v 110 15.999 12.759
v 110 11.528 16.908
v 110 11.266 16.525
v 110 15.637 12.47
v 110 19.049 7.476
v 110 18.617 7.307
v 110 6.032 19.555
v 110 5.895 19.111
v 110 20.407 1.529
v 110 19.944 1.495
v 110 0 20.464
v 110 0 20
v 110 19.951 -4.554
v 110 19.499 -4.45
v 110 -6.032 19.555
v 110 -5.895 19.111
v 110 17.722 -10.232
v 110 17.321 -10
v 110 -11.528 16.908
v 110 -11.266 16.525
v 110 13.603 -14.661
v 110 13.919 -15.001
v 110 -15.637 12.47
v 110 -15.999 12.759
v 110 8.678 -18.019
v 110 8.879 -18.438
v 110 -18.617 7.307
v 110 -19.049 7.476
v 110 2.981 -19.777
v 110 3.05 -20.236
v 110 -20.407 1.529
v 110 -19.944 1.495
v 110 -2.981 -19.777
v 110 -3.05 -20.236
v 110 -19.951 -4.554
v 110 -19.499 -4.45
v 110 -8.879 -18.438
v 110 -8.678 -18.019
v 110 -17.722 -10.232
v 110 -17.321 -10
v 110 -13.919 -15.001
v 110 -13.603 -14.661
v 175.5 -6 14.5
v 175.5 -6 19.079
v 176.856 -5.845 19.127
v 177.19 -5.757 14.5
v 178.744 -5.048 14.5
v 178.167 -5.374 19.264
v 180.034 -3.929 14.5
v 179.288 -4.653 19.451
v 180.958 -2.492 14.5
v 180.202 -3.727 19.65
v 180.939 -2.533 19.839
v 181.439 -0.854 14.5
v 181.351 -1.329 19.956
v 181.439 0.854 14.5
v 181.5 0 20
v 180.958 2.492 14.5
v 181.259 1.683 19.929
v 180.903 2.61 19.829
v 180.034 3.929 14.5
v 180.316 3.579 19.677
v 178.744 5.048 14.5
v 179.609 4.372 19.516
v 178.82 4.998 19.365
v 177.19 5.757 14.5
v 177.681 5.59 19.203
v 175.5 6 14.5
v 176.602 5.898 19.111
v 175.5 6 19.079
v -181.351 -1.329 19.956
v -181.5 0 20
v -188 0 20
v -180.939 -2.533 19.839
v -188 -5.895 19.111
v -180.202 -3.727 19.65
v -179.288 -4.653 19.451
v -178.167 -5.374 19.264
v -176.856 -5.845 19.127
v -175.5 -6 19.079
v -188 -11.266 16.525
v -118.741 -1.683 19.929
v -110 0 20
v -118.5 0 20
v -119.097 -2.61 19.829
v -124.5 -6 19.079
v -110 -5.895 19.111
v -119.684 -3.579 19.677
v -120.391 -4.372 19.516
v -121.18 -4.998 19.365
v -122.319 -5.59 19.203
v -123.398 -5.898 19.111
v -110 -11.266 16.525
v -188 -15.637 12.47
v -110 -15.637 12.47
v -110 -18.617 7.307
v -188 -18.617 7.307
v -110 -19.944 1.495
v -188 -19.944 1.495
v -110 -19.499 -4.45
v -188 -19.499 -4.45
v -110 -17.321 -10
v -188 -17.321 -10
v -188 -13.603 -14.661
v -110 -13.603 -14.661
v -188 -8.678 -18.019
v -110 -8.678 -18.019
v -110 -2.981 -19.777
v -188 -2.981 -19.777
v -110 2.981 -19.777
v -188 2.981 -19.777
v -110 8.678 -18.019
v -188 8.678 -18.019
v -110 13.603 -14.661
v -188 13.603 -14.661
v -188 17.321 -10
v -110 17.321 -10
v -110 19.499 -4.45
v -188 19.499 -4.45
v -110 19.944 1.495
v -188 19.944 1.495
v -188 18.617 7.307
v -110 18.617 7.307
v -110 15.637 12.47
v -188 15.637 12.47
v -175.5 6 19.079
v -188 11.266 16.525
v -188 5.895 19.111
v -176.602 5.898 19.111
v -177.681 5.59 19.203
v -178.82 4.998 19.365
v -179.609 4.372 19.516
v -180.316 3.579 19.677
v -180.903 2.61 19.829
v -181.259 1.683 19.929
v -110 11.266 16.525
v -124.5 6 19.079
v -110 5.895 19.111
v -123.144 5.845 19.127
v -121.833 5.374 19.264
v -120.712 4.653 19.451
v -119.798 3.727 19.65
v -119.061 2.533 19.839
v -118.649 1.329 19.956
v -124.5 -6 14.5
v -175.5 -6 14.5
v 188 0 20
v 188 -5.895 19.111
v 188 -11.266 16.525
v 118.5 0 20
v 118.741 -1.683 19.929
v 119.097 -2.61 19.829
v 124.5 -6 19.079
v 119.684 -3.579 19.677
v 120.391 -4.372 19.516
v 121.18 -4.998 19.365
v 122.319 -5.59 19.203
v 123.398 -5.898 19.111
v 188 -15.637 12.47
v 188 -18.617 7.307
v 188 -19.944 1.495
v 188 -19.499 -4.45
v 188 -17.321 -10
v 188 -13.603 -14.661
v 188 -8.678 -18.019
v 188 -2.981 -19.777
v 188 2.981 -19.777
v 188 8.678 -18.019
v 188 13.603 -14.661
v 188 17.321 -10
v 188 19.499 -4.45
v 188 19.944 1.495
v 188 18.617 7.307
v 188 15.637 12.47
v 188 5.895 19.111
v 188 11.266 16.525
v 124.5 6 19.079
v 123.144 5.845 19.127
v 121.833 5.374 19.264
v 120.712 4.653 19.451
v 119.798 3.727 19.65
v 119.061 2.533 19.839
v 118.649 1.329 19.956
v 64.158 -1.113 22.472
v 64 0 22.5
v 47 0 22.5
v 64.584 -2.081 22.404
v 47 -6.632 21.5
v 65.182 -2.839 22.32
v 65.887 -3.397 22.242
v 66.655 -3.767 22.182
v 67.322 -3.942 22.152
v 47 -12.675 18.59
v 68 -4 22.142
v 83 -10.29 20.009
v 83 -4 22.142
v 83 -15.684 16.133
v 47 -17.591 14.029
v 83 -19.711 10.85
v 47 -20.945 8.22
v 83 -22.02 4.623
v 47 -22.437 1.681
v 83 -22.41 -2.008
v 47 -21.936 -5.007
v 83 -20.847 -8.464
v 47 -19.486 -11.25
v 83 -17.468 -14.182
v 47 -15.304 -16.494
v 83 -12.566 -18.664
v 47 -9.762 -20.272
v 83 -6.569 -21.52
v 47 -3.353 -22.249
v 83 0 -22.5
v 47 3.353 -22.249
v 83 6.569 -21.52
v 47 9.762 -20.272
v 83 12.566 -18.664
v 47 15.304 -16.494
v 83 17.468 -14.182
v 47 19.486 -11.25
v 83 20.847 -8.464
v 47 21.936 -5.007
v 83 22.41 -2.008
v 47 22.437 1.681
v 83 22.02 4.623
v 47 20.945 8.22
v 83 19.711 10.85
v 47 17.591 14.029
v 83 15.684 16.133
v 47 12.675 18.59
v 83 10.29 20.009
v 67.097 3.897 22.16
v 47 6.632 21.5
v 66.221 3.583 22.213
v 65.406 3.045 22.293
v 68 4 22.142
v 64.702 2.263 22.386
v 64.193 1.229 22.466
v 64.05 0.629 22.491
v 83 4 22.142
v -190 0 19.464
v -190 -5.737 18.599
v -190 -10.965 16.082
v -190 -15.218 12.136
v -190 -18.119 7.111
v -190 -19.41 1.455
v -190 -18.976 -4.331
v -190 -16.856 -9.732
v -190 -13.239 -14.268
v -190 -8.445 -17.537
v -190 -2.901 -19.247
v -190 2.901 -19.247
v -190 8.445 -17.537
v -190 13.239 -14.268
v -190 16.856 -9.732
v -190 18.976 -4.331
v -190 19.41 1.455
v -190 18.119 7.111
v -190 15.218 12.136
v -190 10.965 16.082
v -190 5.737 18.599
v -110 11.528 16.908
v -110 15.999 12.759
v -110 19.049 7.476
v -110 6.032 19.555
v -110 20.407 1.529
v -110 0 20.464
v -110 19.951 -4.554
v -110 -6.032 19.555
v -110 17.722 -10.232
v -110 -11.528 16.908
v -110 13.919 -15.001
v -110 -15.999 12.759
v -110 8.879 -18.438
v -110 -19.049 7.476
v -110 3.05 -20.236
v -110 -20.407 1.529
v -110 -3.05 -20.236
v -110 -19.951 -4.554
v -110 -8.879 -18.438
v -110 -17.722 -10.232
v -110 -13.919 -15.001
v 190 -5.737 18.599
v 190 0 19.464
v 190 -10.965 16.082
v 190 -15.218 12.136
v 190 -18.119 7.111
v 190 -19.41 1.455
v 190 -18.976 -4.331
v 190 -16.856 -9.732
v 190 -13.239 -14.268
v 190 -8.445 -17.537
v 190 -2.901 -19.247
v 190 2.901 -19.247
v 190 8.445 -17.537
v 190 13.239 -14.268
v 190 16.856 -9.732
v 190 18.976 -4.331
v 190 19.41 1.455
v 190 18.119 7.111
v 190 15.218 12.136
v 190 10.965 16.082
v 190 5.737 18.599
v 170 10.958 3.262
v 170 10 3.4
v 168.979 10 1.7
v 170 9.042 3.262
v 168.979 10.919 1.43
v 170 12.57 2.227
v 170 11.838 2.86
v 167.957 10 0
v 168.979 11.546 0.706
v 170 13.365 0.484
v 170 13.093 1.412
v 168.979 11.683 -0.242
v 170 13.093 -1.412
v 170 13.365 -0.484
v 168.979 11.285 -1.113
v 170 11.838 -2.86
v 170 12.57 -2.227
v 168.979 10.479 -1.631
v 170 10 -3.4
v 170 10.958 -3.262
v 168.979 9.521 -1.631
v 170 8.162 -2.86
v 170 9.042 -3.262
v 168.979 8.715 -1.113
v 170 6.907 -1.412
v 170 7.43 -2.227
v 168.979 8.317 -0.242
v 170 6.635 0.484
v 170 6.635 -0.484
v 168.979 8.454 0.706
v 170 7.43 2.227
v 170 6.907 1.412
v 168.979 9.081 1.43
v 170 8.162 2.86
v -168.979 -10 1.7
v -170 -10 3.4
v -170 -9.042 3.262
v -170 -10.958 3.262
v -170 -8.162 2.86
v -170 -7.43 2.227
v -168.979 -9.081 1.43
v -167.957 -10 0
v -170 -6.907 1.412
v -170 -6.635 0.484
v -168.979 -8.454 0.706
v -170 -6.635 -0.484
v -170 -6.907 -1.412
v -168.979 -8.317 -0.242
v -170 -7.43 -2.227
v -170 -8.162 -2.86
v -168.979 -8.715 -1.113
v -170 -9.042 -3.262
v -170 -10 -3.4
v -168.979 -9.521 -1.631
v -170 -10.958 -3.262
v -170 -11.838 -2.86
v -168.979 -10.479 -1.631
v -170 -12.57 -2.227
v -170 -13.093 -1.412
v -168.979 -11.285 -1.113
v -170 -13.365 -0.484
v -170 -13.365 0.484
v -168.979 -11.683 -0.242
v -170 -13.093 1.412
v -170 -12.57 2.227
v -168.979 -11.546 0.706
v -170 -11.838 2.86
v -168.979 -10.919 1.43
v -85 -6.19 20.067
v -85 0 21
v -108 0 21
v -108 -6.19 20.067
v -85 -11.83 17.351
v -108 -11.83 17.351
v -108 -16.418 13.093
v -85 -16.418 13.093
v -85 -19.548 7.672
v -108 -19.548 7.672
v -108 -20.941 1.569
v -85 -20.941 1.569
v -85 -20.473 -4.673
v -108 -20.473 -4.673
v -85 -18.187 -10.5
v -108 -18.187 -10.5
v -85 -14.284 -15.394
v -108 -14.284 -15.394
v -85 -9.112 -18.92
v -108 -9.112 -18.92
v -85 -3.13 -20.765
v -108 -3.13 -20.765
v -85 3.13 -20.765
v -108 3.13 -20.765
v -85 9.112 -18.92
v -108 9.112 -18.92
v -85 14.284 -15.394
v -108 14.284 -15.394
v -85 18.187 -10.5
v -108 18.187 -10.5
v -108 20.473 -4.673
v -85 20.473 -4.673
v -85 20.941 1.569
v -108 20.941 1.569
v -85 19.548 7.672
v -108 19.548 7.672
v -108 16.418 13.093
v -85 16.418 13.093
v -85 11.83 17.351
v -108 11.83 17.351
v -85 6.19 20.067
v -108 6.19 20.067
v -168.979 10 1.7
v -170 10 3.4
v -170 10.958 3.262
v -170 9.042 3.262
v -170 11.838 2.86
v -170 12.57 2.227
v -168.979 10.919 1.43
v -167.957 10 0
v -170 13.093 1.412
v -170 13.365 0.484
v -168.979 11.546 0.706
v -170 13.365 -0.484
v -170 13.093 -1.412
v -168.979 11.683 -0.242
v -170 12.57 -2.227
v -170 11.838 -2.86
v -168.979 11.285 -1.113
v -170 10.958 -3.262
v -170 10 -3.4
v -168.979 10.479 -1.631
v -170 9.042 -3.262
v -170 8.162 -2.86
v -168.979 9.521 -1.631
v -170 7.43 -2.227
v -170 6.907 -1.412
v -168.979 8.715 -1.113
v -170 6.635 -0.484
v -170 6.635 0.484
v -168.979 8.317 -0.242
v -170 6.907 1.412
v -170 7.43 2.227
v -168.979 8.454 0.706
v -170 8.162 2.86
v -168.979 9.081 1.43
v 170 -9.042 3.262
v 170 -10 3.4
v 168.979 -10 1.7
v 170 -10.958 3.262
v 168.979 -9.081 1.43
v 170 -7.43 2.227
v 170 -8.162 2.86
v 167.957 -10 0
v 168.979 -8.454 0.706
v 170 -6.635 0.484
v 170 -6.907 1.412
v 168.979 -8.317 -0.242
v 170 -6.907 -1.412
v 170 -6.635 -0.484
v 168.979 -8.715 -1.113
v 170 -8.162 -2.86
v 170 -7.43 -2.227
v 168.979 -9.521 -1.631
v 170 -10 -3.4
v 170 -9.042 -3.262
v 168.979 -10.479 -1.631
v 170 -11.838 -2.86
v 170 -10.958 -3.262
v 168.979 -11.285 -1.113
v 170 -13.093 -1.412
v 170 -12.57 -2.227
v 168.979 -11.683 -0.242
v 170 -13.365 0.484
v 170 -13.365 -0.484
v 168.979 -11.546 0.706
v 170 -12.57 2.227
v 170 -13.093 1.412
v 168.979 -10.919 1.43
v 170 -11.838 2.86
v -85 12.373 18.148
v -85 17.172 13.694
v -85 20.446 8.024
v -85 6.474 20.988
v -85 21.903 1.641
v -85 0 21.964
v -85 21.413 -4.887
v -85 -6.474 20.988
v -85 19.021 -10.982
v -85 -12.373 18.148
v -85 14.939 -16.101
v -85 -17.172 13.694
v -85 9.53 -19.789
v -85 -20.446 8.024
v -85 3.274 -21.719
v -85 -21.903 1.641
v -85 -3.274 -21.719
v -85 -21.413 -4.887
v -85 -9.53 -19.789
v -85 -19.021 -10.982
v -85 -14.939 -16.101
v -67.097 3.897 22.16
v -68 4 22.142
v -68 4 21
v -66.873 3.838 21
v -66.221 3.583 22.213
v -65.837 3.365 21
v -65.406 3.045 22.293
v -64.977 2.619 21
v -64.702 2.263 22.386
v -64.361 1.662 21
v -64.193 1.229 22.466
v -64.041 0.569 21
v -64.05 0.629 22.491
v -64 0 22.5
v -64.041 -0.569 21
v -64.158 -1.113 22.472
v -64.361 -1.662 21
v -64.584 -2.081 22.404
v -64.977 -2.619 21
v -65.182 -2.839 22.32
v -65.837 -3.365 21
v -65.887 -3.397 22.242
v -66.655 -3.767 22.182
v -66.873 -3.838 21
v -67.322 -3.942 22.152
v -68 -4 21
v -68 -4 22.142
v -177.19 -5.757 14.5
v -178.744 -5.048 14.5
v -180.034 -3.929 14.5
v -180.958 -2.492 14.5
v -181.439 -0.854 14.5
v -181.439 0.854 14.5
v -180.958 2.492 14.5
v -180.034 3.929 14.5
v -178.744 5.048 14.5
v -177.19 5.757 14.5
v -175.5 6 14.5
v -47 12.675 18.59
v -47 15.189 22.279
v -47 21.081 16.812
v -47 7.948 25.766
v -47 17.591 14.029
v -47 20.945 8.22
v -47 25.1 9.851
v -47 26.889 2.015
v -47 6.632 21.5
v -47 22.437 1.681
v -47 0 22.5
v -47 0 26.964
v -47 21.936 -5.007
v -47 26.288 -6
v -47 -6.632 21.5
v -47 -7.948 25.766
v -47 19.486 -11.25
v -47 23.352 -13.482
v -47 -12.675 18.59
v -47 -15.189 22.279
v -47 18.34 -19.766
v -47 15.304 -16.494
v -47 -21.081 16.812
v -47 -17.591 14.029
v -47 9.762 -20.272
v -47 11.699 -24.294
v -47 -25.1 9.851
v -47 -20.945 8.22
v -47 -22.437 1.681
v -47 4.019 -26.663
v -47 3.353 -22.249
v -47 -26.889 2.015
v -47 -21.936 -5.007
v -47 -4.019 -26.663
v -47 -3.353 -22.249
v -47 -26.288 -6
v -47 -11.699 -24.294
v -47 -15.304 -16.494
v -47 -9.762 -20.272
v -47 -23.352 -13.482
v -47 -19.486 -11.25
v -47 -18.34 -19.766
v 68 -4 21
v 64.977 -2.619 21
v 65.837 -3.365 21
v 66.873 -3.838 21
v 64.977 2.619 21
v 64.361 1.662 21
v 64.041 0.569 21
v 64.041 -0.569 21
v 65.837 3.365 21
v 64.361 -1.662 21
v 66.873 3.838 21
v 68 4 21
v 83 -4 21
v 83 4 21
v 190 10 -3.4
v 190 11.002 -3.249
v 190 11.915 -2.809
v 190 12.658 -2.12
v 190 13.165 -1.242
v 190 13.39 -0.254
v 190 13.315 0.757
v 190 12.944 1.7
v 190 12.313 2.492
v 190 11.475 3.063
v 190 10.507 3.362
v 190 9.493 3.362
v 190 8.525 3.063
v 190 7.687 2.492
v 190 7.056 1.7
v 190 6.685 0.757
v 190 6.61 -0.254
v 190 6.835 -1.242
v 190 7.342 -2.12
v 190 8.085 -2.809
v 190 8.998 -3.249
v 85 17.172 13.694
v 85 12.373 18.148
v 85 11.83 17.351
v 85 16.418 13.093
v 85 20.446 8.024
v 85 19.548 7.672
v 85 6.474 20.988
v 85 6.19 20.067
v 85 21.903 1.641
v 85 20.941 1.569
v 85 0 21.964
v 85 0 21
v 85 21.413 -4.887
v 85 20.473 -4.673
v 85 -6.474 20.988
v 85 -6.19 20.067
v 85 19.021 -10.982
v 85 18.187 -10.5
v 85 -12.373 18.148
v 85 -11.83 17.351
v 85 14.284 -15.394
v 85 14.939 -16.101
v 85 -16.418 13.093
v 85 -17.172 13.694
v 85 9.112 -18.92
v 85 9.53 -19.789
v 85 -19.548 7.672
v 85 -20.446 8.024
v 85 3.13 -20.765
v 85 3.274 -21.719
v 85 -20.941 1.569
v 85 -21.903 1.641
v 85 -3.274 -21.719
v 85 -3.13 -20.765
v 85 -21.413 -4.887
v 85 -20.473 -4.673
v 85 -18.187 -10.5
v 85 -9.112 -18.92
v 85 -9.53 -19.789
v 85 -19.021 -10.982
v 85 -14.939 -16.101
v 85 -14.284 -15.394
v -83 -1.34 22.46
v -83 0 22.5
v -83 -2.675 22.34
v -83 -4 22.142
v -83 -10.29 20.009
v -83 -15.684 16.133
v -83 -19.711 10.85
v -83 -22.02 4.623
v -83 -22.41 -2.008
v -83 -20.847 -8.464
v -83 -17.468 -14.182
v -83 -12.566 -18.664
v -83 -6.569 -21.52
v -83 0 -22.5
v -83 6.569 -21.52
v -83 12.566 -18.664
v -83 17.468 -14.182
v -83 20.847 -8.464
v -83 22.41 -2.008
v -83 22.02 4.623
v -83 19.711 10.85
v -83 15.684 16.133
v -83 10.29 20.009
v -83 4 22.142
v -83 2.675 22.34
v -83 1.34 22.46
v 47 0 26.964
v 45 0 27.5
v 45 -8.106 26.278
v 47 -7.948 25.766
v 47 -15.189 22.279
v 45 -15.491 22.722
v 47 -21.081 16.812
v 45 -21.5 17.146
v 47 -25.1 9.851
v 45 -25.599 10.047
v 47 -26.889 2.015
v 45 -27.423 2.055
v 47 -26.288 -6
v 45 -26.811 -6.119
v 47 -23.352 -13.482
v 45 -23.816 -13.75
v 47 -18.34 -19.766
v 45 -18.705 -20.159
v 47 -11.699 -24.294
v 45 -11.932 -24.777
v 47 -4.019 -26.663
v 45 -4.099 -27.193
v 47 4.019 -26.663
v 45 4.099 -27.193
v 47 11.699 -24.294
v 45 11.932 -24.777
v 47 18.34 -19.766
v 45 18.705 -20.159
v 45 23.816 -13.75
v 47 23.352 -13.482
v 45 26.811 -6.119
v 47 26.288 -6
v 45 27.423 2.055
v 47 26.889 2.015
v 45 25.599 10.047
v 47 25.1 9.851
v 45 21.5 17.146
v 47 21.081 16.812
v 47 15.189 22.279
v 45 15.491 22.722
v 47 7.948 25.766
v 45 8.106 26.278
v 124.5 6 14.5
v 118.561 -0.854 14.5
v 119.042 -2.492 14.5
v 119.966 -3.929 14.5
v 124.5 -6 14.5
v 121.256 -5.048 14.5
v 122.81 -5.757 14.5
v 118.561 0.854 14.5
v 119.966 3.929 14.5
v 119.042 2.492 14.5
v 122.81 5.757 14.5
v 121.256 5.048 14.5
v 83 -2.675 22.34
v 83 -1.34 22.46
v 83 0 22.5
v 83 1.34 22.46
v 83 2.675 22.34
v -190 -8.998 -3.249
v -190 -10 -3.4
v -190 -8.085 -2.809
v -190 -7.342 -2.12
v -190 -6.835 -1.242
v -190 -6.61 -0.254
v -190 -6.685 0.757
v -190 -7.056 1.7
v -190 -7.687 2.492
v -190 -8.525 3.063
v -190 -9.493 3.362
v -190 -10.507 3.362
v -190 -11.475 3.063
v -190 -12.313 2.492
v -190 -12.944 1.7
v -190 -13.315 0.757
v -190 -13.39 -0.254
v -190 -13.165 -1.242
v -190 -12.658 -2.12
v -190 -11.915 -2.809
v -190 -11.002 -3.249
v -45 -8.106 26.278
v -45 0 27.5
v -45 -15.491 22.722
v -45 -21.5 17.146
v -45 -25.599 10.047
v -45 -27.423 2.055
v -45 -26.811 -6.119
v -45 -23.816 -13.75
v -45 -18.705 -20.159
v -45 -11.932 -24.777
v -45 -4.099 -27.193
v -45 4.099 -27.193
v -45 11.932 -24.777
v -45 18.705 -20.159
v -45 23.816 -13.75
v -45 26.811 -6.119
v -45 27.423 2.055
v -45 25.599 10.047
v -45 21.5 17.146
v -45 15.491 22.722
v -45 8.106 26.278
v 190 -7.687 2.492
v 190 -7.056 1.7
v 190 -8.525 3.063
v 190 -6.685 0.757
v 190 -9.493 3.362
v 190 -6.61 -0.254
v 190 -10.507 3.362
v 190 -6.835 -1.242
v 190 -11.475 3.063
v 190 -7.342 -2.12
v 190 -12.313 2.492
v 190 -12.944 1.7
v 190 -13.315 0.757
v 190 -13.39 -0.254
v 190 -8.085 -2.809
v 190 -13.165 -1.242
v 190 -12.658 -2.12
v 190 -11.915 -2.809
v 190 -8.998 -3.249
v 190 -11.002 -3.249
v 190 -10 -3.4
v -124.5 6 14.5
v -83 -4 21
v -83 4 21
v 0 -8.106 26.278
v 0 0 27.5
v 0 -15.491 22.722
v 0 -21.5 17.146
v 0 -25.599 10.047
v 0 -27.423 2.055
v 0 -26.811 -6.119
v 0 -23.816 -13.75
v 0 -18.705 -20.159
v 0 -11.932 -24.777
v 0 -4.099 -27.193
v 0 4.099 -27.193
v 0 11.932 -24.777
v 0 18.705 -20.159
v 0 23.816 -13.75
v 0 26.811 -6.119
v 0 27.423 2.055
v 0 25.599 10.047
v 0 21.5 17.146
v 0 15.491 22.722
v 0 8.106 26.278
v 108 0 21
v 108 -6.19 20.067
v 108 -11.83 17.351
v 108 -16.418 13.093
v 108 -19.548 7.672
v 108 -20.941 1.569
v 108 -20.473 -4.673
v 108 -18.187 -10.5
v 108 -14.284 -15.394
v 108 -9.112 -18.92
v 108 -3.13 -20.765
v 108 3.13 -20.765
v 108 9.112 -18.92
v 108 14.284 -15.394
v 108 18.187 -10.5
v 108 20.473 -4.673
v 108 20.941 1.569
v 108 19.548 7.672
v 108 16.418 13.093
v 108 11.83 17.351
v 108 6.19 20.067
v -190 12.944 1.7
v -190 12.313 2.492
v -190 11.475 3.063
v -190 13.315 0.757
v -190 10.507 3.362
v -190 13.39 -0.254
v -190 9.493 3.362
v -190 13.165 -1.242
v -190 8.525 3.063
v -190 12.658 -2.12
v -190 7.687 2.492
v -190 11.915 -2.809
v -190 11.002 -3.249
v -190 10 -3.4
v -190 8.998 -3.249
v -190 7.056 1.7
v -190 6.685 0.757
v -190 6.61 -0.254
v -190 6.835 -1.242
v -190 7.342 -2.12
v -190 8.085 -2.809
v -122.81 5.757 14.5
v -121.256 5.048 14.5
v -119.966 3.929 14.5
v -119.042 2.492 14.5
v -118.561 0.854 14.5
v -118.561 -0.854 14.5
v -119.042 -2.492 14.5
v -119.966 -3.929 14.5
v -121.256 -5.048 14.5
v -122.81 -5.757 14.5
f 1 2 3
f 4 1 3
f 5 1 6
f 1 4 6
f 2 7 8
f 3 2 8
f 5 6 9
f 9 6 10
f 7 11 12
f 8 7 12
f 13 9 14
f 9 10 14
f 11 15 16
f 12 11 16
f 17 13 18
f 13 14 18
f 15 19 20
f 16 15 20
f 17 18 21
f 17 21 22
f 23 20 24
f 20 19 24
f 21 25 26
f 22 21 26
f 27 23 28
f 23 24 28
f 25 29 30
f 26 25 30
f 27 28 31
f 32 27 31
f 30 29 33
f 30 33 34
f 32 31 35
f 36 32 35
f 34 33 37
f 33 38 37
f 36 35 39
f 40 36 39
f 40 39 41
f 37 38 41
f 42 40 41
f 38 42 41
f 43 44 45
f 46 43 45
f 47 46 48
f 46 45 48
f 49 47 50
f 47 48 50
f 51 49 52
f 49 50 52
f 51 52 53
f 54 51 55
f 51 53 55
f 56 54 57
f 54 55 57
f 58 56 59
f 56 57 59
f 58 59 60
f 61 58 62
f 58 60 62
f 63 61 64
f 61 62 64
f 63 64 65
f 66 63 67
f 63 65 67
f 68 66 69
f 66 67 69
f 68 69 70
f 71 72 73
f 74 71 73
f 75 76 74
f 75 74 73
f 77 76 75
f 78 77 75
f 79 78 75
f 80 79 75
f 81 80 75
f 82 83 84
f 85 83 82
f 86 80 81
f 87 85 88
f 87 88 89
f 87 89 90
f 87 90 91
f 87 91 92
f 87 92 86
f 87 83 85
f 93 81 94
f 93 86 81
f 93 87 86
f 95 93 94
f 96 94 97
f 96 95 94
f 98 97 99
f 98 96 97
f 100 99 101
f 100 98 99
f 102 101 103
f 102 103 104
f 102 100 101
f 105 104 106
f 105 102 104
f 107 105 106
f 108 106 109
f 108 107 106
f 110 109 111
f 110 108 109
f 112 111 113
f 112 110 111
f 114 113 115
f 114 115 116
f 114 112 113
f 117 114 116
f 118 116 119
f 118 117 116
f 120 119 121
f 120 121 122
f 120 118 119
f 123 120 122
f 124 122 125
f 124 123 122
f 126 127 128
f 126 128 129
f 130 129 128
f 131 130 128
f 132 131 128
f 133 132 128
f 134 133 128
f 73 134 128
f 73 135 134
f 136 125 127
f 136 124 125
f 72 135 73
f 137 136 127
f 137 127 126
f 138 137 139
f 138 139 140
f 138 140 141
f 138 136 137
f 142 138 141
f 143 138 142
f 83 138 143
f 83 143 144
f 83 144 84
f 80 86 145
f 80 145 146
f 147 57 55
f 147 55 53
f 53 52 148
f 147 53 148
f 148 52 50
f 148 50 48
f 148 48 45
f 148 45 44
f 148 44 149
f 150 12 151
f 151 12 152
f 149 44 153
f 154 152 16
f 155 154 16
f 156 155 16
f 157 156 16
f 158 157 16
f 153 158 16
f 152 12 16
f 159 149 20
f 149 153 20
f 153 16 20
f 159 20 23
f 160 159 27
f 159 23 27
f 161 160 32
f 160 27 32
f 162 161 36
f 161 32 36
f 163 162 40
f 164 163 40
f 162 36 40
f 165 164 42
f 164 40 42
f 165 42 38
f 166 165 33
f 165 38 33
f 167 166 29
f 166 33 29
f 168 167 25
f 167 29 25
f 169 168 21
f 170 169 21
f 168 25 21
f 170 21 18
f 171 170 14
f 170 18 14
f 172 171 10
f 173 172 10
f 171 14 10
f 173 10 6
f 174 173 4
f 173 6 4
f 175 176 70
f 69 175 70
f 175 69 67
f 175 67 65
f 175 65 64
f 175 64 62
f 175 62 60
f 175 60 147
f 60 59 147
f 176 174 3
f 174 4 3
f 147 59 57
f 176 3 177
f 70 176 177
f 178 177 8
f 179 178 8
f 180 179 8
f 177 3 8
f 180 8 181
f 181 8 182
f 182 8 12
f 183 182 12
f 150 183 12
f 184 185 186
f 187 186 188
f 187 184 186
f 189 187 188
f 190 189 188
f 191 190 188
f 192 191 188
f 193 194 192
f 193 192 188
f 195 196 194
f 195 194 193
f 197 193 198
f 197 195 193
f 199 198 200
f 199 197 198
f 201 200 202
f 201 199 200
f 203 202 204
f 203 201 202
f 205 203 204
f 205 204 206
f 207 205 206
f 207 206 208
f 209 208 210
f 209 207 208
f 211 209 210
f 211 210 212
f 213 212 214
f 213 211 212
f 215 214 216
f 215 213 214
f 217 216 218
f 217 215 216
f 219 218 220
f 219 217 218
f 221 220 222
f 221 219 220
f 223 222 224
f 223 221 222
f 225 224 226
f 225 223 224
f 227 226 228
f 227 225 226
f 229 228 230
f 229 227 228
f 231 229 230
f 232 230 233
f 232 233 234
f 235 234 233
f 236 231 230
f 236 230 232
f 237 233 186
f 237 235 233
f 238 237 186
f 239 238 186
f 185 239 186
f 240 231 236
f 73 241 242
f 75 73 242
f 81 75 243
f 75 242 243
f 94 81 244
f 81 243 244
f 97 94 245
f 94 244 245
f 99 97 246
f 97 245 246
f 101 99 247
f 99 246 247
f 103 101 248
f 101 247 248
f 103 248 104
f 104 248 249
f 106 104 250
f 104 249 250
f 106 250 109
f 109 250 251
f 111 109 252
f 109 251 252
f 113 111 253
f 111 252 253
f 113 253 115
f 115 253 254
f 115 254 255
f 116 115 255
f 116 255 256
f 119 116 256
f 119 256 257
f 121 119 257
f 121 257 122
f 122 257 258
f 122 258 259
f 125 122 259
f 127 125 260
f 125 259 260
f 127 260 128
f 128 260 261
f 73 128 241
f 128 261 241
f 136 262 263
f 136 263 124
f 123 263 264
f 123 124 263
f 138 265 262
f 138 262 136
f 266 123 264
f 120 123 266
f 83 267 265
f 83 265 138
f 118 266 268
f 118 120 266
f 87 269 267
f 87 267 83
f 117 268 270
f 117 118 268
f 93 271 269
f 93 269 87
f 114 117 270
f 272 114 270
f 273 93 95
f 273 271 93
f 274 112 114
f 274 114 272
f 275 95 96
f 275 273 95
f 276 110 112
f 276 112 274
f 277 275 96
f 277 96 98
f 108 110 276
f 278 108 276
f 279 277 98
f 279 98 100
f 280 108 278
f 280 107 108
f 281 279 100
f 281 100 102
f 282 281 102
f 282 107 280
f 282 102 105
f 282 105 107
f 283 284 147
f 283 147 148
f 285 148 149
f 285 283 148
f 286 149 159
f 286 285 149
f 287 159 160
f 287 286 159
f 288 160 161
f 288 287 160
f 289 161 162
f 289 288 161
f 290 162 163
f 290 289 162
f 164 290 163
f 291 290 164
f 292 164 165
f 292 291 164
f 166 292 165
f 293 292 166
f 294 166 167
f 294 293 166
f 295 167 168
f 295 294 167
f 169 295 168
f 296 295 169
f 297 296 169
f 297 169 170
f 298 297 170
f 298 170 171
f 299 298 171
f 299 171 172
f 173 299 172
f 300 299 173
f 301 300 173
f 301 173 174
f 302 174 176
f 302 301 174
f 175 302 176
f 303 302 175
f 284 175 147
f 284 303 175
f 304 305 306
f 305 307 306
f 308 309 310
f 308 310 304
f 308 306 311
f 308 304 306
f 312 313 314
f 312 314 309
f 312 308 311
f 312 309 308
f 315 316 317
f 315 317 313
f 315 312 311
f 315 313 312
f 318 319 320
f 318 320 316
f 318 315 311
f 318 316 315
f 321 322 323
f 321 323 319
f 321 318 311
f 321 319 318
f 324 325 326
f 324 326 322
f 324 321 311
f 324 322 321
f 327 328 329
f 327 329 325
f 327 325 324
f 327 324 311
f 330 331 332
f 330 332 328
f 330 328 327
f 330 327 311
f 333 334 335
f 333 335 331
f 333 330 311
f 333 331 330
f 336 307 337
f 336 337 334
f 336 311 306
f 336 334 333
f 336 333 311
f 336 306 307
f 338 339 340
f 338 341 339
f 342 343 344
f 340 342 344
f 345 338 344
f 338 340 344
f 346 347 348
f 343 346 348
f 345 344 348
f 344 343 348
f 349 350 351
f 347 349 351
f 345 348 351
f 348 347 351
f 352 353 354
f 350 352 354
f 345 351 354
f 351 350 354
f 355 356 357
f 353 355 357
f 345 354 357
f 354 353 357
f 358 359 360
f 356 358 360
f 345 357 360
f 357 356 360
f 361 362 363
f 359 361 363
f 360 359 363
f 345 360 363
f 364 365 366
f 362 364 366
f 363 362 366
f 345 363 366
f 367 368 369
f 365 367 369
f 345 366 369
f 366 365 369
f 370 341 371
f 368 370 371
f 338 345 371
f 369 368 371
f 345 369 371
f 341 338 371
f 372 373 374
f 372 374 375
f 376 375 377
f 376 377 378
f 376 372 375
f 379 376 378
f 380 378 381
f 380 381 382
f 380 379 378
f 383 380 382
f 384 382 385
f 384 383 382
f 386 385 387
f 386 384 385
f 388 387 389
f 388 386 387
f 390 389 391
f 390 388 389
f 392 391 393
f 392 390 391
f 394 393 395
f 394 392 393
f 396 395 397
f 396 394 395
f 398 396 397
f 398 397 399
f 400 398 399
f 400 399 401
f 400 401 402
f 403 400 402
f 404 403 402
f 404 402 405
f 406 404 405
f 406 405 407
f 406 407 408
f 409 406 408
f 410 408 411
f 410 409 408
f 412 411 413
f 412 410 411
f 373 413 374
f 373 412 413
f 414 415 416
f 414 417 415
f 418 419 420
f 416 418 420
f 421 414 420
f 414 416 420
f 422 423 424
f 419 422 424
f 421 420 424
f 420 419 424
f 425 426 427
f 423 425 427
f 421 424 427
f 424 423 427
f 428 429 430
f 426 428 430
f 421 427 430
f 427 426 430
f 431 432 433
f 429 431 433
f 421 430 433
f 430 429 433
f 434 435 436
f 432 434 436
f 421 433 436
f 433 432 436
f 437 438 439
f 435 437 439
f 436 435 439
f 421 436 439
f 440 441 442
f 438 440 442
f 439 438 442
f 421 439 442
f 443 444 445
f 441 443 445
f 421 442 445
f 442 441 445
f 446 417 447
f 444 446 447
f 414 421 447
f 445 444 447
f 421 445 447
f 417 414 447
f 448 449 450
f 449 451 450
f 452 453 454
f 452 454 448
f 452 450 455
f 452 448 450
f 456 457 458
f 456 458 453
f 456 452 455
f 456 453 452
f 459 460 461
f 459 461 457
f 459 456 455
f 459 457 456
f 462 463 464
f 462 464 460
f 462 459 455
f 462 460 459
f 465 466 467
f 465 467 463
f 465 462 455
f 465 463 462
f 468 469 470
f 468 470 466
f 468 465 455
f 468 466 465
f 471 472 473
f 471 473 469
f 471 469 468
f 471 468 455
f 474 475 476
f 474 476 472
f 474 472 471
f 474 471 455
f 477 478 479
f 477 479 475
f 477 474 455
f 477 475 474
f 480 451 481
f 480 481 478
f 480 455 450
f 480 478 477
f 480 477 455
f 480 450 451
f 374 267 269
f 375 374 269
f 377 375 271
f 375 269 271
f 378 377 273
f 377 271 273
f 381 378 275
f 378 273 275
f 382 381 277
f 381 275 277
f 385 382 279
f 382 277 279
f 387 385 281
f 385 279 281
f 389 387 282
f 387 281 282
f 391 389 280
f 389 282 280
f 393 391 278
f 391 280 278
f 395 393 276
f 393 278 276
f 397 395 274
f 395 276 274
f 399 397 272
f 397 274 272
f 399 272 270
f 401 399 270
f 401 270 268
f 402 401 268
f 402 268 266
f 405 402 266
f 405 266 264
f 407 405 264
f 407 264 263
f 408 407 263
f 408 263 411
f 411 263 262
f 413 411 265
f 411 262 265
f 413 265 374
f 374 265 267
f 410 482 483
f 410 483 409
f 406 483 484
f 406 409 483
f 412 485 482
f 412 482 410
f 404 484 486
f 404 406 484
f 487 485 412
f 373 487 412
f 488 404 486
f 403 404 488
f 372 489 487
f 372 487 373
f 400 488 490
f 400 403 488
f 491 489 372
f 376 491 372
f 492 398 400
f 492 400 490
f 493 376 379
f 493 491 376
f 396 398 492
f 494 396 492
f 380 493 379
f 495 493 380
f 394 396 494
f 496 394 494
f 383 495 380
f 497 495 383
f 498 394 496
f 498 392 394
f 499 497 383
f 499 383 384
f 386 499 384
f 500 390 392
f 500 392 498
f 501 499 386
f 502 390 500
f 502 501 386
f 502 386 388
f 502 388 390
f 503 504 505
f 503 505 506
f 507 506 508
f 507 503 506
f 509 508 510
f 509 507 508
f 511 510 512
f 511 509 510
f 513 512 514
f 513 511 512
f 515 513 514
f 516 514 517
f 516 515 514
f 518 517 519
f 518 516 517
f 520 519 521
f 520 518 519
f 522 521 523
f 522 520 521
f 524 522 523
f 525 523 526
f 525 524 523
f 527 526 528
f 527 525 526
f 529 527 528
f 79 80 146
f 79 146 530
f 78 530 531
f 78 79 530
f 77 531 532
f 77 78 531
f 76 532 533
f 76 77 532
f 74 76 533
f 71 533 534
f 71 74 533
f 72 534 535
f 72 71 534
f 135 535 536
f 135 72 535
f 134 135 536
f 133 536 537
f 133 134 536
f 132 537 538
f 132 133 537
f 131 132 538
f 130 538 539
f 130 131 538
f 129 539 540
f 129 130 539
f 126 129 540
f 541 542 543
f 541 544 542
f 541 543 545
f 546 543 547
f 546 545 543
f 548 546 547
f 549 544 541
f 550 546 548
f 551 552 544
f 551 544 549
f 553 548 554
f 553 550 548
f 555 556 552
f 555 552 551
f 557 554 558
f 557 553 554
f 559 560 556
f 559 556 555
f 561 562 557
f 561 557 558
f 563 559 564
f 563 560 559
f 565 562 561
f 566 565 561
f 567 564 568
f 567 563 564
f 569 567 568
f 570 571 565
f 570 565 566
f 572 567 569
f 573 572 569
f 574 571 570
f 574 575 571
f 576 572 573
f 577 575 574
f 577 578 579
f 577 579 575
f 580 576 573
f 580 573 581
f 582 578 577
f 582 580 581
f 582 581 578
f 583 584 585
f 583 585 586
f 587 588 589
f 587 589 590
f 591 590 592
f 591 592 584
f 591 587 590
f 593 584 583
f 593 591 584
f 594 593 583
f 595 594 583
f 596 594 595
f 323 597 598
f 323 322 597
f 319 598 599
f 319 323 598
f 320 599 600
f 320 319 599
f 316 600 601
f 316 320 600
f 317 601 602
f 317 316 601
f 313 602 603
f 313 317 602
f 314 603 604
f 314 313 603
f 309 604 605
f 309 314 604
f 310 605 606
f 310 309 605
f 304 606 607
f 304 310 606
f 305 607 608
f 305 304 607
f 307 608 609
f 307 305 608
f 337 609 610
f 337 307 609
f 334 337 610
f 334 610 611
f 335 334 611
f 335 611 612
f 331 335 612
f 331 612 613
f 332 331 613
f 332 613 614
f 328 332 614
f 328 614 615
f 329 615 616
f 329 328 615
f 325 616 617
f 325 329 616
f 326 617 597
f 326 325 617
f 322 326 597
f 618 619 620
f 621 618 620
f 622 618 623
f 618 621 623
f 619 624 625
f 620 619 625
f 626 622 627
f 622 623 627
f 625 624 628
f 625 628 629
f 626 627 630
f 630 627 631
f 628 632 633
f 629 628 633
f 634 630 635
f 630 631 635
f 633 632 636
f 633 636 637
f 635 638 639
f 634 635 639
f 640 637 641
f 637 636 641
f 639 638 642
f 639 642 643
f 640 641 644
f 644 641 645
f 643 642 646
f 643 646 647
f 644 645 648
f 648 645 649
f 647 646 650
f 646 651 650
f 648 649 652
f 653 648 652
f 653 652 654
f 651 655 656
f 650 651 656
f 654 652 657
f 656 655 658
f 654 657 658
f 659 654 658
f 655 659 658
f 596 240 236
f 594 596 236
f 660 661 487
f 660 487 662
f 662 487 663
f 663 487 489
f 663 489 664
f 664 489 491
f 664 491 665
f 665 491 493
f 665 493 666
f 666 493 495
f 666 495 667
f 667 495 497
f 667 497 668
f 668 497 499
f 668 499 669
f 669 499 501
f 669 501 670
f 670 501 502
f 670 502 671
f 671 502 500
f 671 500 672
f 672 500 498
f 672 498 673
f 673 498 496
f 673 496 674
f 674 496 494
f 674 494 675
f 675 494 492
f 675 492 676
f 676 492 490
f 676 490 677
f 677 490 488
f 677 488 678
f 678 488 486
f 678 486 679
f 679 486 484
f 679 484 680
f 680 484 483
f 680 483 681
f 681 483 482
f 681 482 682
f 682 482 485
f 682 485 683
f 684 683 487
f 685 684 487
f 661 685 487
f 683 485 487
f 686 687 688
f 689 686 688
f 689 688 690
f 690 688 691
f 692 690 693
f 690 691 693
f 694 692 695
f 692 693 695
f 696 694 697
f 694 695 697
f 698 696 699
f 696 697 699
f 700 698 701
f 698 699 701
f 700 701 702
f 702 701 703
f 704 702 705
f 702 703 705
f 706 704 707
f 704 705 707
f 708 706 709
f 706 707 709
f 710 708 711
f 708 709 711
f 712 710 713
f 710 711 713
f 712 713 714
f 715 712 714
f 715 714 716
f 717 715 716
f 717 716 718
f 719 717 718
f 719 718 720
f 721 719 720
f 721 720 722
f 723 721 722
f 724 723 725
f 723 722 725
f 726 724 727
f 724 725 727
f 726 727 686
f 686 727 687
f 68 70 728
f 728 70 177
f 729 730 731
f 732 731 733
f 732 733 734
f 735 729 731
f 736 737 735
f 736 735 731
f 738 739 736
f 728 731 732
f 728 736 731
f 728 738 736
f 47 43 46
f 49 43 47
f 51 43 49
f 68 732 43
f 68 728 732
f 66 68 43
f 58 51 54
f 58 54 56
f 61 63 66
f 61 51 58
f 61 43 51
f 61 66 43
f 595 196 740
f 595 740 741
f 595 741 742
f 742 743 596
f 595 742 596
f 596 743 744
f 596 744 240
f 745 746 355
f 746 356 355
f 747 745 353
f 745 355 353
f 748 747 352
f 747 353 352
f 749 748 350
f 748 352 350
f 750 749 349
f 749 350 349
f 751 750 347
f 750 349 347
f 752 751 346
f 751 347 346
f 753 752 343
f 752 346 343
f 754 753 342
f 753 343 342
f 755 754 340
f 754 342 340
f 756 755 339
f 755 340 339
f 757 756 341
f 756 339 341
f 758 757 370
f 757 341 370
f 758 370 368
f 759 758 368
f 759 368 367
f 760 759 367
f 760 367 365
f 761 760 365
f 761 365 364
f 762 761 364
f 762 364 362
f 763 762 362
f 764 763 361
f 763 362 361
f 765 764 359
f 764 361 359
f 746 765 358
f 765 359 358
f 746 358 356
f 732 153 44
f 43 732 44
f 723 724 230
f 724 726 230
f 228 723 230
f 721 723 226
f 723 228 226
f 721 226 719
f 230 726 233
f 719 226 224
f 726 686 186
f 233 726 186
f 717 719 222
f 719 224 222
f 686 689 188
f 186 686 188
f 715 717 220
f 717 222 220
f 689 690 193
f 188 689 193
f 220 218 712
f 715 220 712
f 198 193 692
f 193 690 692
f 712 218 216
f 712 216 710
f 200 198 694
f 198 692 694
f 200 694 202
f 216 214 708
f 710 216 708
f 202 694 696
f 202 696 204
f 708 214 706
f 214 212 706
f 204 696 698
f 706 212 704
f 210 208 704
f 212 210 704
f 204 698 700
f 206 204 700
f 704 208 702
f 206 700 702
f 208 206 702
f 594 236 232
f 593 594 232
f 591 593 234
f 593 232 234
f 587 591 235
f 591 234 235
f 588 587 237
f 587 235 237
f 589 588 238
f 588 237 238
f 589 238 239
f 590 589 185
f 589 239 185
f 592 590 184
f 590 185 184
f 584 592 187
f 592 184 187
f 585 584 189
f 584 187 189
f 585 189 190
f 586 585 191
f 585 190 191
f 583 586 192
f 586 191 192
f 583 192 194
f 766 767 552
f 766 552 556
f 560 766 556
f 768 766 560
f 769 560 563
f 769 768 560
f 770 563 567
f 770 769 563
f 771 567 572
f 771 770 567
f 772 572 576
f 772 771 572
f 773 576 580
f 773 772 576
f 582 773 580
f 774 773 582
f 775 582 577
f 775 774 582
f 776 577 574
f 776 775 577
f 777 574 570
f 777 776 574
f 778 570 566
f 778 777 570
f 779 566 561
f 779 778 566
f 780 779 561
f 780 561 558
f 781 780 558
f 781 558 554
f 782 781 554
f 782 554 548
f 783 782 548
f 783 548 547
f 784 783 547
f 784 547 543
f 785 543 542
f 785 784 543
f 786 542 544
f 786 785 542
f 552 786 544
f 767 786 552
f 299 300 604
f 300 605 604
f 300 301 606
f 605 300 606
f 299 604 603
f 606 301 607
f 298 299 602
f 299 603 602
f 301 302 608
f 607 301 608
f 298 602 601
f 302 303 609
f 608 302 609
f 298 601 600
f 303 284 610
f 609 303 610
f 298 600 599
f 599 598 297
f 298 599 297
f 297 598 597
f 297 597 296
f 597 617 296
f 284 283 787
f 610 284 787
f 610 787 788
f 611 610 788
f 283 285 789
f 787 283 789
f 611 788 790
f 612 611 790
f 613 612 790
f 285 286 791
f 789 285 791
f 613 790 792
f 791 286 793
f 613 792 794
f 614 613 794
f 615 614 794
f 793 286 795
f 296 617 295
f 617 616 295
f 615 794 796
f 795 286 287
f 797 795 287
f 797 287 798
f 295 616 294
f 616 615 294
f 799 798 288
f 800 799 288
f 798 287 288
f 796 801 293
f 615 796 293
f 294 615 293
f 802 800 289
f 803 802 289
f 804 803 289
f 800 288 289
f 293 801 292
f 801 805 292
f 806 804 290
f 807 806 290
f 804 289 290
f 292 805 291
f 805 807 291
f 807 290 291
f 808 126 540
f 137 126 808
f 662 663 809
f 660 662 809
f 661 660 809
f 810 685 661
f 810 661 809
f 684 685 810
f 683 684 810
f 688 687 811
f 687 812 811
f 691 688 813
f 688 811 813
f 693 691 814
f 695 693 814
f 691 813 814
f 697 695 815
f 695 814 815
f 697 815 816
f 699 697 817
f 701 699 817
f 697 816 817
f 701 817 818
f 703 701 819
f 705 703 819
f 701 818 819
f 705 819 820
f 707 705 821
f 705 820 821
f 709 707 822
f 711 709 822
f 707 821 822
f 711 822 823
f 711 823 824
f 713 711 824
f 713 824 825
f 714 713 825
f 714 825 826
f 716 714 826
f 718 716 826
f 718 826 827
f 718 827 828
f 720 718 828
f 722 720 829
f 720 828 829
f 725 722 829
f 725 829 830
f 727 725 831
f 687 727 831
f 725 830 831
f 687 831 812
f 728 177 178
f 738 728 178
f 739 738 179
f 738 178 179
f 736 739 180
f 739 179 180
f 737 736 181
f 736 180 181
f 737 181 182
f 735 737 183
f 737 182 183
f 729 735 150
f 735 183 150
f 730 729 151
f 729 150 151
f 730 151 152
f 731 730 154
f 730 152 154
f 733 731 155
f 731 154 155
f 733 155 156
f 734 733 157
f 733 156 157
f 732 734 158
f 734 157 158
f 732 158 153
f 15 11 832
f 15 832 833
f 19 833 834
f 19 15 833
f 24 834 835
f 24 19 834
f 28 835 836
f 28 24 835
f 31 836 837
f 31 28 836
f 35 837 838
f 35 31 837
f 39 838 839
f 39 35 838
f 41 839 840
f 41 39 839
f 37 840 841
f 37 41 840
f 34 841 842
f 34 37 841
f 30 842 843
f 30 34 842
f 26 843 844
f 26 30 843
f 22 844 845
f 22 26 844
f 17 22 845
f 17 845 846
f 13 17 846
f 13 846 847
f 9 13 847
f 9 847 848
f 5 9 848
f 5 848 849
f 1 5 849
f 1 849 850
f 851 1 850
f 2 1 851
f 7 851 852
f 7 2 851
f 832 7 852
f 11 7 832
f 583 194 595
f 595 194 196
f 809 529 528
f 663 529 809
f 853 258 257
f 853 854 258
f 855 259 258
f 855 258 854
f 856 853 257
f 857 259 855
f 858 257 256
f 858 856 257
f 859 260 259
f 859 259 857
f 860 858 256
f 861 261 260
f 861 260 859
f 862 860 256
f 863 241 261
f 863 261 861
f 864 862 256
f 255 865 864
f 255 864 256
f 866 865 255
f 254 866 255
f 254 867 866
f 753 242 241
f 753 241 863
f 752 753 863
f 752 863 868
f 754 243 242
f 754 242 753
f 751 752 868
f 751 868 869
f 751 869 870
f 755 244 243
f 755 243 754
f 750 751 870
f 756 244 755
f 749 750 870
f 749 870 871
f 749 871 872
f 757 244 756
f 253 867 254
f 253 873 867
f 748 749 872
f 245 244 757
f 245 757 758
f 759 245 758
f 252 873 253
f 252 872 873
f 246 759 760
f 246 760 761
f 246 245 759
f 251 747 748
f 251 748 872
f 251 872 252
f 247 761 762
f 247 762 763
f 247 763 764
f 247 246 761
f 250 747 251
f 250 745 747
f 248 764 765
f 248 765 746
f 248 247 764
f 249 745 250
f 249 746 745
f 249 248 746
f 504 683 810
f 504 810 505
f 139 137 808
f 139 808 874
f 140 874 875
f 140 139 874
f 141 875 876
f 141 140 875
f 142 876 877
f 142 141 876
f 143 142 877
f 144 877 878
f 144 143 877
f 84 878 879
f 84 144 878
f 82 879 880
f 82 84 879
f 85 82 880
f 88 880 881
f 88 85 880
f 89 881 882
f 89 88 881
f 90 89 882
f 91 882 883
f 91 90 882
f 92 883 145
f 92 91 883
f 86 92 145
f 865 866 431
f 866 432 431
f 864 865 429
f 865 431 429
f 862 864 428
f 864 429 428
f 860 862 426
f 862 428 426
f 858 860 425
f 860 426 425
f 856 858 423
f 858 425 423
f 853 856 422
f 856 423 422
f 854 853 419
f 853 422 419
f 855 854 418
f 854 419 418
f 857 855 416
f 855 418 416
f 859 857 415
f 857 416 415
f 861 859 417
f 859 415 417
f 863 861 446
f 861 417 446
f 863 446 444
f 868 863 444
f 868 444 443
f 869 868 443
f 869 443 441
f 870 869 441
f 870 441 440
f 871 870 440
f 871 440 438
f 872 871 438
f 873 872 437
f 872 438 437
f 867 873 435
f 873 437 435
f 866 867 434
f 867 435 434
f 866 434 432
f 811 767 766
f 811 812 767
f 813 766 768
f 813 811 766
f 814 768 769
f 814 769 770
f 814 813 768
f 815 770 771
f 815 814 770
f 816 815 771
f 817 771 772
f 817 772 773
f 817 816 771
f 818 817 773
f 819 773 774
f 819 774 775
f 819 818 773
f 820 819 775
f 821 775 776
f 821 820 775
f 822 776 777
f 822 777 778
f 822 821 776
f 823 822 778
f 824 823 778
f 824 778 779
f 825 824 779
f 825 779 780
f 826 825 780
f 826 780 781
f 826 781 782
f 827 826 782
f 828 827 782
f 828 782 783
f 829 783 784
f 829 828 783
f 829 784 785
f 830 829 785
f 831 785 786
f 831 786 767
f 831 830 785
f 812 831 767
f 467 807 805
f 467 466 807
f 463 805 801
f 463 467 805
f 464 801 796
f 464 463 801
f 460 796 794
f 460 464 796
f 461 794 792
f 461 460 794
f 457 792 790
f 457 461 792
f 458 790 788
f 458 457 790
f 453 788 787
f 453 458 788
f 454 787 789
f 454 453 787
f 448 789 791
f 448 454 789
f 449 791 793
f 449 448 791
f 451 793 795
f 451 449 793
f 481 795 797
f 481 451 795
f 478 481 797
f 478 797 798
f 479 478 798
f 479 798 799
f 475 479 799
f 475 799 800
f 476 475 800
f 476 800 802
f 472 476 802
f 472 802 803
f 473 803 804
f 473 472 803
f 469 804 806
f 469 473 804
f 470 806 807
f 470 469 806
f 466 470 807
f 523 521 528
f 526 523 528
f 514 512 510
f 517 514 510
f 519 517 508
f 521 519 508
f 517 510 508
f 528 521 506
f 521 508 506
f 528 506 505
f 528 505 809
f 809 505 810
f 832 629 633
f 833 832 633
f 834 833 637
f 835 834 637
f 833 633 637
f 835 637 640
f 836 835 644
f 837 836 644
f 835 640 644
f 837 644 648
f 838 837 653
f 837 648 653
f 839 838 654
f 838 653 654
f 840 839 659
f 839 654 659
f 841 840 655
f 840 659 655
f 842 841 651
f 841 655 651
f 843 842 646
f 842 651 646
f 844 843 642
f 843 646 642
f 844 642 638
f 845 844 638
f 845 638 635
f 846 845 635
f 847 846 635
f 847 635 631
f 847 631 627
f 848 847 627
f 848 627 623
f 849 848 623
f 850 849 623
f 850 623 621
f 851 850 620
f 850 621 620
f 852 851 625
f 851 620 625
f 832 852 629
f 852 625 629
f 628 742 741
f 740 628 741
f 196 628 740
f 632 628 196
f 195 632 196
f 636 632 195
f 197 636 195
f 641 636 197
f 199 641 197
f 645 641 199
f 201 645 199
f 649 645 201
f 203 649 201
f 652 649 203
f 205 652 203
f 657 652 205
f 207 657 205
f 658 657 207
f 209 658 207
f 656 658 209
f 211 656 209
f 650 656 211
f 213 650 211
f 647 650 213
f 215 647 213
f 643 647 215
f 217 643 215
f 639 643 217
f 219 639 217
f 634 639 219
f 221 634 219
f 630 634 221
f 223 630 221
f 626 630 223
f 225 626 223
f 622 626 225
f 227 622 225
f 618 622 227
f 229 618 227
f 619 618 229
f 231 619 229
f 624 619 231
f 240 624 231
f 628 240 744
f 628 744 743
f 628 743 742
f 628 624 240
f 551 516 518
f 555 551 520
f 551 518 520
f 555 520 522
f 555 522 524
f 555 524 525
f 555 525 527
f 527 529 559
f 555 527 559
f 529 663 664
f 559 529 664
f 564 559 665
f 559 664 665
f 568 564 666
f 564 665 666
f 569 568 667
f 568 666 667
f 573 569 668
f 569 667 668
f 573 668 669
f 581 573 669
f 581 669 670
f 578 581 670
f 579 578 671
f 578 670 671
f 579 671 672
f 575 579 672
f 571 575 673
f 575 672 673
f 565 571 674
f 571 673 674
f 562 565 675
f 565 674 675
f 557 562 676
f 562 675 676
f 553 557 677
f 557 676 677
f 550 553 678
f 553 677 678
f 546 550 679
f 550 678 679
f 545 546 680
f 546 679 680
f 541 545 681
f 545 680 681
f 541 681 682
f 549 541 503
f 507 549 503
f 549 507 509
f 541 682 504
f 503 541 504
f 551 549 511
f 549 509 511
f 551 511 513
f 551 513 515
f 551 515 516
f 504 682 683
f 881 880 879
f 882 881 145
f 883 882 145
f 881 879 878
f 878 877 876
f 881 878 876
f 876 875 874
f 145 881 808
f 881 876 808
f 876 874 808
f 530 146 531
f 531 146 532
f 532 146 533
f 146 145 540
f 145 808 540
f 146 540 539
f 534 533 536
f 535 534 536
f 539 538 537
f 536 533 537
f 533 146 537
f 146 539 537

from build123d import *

# Parameters (mm, degrees)
FASE1_SIZE                      = 0.535898385
FASE1_SIZE2                     = 2
FASE1_EDGE_2_SIZE               = 2
FASE1_EDGE_2_SIZE2              = 0.535898385
FASE1_EDGE_3_SIZE               = 2
FASE1_EDGE_3_SIZE2              = 0.535898385
SCHNITT_LINEAR_AUSTRAGEN1_DEPTH = 5.5
M8_GEWINDEBOHRUNG1_D            = 6.8
M8_GEWINDEBOHRUNG1_DEPTH        = 20
M8_GEWINDEBOHRUNG1_TIP          = 2.042926105
FASE2_SIZE                      = 2
FASE2_SIZE2                     = 0.535898385
SCHNITT_LINEAR_AUSTRAGEN2_DEPTH = 1.5


with BuildPart() as part:
    # Skizze1 → Rotation1 (revolve)
    with BuildSketch(Plane.XY, mode=Mode.PRIVATE) as rotation1_sk:
        Polygon((-85, 22.5), (-70, 22.5), (-47, 22.5), (-47, 27.5), (0, 27.5), (0, 0), (-190, 0), (-190, 20), (-110, 20), (-110, 21), (-85, 21), align=None)
    revolve(rotation1_sk.sketch.rotate(Axis((-55.076928245, 0, 0), (1, 0, 0)), 90), axis=Axis((-55.076928245, 0, 0), (1, 0, 0)))  # turned: the seam where the file's is

    # Fase1
    fase1_edges = [part.edges().sort_by_distance(p)[0] for p in [
        (-47, 0, -27.5),
    ]]
    fase1_side = [part.faces().sort_by_distance(p)[0] for p in [
        (-47, 0, -23.277817459),
    ]]
    chamfer(fase1_edges, length=FASE1_SIZE, length2=FASE1_SIZE2, reference=fase1_side[0])

    # Fase1 edge 2
    fase1_edge_2_edges = [part.edges().sort_by_distance(p)[0] for p in [
        (-85, 0, -22.5),
    ]]
    fase1_edge_2_side = [part.faces().sort_by_distance(p)[0] for p in [
        (-66, 0, -22.5),
    ]]
    chamfer(fase1_edge_2_edges, length=FASE1_EDGE_2_SIZE, length2=FASE1_EDGE_2_SIZE2, reference=fase1_edge_2_side[0])

    # Fase1 edge 3
    fase1_edge_3_edges = [part.edges().sort_by_distance(p)[0] for p in [
        (-110, 0, -21),
    ]]
    fase1_edge_3_side = [part.faces().sort_by_distance(p)[0] for p in [
        (-97.5, 0, -21),
    ]]
    chamfer(fase1_edge_3_edges, length=FASE1_EDGE_3_SIZE, length2=FASE1_EDGE_3_SIZE2, reference=fase1_edge_3_side[0])

    # Skizze2 → Schnitt-Linear austragen1 (cut)
    with BuildSketch(Plane.XY.offset(20)):
        with BuildLine():
            Line((-175.5, 6), (-124.5, 6))
            ThreePointArc((-124.5, 6), (-118.5, 0), (-124.5, -6))
            Line((-124.5, -6), (-175.5, -6))
            ThreePointArc((-175.5, -6), (-181.5, 0), (-175.5, 6))
        make_face()
    extrude(amount=-SCHNITT_LINEAR_AUSTRAGEN1_DEPTH, mode=Mode.SUBTRACT)

    # M8 Gewindebohrung1
    with Locations(Plane.ZY.offset(190)):
        with Locations((0, 10), (0, -10)):
            Hole(M8_GEWINDEBOHRUNG1_D / 2, depth=M8_GEWINDEBOHRUNG1_DEPTH)
            with Locations((0, 0, -(M8_GEWINDEBOHRUNG1_DEPTH + M8_GEWINDEBOHRUNG1_TIP / 2))):  # 118° drill point
                Cone(0, M8_GEWINDEBOHRUNG1_D / 2, M8_GEWINDEBOHRUNG1_TIP, mode=Mode.SUBTRACT)

    # Fase2
    fase2_edges = [part.edges().sort_by_distance(p)[0] for p in [
        (-190, 0, -20),
    ]]
    fase2_side = [part.faces().sort_by_distance(p)[0] for p in [
        (-150, 0, -20),
    ]]
    chamfer(fase2_edges, length=FASE2_SIZE, length2=FASE2_SIZE2, reference=fase2_side[0])

    # Skizze8 → Schnitt-Linear austragen2 (cut)
    with BuildSketch(Plane.XY.offset(22.5)):
        with BuildLine():
            Line((-83, 4), (-68, 4))
            ThreePointArc((-68, 4), (-64, 0), (-68, -4))
            Line((-68, -4), (-83, -4))
            Line((-83, -4), (-83, 4))
        make_face()
    extrude(amount=-SCHNITT_LINEAR_AUSTRAGEN2_DEPTH, mode=Mode.SUBTRACT)

    # Spiegeln1: part across plane


with BuildPart() as part_1:
    add(part.part)
    add(part.part.mirror(Plane.ZY))


solid = part_1.part
